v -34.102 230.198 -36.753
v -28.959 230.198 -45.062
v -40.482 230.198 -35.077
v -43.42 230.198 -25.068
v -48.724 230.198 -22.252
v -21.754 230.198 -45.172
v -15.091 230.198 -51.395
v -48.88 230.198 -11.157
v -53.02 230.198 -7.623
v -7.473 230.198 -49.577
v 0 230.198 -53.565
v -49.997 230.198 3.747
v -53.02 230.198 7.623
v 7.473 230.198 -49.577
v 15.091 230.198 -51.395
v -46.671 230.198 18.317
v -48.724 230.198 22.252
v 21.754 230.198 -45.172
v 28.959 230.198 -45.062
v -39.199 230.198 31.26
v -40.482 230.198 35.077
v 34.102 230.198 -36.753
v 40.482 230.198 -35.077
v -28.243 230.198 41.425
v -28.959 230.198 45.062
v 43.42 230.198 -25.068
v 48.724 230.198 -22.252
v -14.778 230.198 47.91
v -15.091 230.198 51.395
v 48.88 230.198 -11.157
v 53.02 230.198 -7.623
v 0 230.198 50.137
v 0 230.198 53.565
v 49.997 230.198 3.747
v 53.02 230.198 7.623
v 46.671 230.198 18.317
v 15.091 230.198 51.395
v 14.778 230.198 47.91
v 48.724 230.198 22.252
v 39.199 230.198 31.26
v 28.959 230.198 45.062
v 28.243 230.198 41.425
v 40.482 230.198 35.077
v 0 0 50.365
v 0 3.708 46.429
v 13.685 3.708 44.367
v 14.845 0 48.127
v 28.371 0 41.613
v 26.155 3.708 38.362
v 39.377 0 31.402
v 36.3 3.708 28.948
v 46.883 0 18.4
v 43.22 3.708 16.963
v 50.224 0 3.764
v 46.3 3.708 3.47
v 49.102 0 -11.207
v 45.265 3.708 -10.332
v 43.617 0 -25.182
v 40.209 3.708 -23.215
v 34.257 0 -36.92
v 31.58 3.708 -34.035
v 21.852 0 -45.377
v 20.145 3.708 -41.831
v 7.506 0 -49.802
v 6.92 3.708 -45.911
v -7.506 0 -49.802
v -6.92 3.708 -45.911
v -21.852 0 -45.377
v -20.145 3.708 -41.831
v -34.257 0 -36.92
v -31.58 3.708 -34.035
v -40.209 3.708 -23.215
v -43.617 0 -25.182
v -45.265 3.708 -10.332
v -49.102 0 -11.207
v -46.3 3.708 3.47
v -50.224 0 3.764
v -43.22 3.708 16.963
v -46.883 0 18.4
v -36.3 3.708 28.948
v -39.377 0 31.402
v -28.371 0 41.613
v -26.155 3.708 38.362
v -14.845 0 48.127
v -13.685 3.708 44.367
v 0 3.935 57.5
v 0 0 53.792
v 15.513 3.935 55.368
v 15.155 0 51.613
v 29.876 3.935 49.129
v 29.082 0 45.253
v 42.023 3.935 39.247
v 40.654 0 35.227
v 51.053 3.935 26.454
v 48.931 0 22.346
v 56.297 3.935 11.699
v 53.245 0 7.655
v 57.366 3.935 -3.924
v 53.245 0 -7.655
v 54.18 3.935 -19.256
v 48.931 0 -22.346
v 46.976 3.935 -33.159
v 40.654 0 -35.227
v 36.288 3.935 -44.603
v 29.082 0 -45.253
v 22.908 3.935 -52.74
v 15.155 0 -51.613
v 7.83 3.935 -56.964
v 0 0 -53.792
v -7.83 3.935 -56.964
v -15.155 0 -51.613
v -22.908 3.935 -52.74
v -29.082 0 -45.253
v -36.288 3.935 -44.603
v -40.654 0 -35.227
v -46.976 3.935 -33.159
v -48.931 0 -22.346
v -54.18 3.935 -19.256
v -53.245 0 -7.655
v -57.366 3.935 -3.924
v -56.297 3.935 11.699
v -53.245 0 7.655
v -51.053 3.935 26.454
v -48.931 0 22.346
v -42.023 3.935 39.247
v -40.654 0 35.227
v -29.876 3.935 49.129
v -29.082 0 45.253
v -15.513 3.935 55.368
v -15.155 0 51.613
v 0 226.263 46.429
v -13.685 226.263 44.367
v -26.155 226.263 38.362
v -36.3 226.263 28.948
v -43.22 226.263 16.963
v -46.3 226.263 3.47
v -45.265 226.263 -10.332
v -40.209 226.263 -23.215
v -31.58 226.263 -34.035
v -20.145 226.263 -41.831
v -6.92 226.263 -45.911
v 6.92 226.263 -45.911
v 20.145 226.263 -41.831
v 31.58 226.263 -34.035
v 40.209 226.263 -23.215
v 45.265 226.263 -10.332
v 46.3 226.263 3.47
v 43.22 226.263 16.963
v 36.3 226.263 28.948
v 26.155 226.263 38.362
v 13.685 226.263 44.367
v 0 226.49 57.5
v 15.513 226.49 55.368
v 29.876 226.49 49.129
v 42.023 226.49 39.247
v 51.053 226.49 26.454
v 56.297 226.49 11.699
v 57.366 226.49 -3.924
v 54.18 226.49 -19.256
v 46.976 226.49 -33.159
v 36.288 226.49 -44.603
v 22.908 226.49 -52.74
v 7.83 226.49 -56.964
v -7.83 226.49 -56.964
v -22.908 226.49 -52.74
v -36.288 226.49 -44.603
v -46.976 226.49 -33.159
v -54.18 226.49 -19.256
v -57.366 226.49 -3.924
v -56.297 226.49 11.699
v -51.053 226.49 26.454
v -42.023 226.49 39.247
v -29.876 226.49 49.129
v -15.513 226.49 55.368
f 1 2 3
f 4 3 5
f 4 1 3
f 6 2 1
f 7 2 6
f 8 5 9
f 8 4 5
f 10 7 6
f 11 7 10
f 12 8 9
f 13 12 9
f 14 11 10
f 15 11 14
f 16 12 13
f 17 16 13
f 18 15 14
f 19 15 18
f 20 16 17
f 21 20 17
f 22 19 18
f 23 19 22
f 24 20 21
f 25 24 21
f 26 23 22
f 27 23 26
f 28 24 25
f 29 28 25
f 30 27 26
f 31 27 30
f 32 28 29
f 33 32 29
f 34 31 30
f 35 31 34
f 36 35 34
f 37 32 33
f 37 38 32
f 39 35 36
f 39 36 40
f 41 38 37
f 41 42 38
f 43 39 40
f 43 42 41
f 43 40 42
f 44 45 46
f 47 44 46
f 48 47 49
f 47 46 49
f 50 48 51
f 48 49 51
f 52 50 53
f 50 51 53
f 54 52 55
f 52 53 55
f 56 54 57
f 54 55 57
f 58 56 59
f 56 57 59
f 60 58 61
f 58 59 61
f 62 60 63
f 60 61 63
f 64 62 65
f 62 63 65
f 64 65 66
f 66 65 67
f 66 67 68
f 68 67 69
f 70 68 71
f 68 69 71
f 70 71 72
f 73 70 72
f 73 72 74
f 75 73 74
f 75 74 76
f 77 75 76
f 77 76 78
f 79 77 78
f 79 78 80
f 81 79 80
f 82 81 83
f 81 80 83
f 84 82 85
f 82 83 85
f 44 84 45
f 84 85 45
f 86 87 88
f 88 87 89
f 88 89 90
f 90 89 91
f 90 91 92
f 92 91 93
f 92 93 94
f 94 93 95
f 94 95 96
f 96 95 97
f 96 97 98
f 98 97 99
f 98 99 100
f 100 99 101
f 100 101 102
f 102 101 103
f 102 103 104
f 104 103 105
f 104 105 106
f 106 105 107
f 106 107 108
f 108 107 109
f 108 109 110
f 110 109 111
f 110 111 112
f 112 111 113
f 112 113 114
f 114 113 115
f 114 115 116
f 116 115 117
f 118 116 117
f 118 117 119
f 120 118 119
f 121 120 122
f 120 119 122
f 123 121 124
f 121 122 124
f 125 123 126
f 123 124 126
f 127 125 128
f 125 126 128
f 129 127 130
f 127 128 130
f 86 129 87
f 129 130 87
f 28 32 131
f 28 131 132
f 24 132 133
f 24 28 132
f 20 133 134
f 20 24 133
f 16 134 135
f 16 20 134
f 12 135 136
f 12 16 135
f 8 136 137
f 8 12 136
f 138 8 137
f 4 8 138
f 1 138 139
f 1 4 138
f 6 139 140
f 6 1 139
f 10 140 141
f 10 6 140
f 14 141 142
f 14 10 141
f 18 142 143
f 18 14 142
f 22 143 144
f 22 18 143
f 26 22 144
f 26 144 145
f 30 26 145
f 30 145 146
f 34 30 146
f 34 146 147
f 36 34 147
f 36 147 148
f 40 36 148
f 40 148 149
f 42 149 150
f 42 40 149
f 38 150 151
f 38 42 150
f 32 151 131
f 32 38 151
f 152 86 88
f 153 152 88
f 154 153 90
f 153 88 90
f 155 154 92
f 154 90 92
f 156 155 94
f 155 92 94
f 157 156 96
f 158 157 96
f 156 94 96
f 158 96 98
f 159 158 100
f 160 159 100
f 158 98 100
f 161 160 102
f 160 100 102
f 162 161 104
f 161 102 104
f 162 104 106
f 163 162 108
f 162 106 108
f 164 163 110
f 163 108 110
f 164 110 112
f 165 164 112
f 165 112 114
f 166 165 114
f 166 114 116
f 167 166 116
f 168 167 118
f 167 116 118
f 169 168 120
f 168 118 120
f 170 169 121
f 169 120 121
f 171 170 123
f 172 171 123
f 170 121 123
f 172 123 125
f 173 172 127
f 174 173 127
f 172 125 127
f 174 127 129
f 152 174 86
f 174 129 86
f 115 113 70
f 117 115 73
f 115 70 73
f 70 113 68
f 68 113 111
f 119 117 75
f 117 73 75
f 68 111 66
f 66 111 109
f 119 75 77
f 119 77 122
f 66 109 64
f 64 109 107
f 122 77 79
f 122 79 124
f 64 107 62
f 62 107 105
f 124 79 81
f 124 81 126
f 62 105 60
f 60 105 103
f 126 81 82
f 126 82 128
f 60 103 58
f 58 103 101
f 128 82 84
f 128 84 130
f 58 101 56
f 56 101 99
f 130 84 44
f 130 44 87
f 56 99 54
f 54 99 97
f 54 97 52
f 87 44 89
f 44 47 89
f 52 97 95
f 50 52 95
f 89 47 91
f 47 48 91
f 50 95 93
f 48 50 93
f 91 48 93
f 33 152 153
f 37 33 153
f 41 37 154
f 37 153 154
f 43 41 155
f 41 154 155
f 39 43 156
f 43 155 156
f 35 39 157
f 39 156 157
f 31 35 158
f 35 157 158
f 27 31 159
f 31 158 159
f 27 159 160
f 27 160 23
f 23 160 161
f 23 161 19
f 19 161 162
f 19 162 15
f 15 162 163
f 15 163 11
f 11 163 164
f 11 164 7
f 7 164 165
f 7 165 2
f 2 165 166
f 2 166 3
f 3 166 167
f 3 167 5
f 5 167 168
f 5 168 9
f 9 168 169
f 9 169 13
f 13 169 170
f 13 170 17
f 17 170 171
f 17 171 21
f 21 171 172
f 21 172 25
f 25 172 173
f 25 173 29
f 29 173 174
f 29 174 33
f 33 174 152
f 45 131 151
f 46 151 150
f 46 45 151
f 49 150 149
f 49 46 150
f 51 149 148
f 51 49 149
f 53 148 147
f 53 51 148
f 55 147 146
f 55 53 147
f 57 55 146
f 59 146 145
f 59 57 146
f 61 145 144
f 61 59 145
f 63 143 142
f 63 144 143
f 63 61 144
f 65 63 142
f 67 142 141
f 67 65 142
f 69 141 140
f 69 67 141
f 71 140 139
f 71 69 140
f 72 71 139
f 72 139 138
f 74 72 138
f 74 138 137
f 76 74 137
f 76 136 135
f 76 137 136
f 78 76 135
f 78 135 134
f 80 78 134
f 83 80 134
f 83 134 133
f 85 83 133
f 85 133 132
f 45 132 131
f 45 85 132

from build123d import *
from OCP.BRepFilletAPI import BRepFilletAPI_MakeChamfer

# Parameters (mm, degrees)
SKETCH1_R           = 57.5
BOSS_EXTRUDE1_DEPTH = 230.197861075
SKETCH2_R           = 46.429396427
CUT_EXTRUDE1_DEPTH  = 245.138393629
CHAMFER1_SIZE       = 3.707562958
CHAMFER1_SIZE2      = 3.935280895


with BuildPart() as part:
    # Sketch1 → Boss-Extrude1 (new body)
    with BuildSketch(Plane(origin=(0, 0, 0), x_dir=(1, 0, 0), z_dir=(0, 1, 0))):
        Circle(SKETCH1_R)
    extrude(amount=BOSS_EXTRUDE1_DEPTH)

    # Sketch2 → Cut-Extrude1 (cut, through all)
    with BuildSketch(Plane(origin=(0, 0, 0), x_dir=(1, 0, 0), z_dir=(0, 1, 0))):
        Circle(SKETCH2_R)
    extrude(amount=CUT_EXTRUDE1_DEPTH, mode=Mode.SUBTRACT)

    # Chamfer1: one chamfer whose edges measure the first distance from different faces: ONE call of the kernel's chamfer builder (chamfer() names one face for all edges)
    chamfer1_edges_1 = [part.edges().sort_by_distance(p)[0] for p in [
        (-46.429396427, 230.197861075, 0),
    ]]
    chamfer1_side_1 = [part.faces().sort_by_distance(p)[0] for p in [
        (-55.873654403, 230.197861075, 0),
    ]]
    chamfer1_edges_2 = [part.edges().sort_by_distance(p)[0] for p in [
        (-46.429396427, 0, 0),
    ]]
    chamfer1_side_2 = [part.faces().sort_by_distance(p)[0] for p in [
        (-46.429396427, 115.098930538, 0),
    ]]
    chamfer1_edges_3 = [part.edges().sort_by_distance(p)[0] for p in [
        (-57.5, 0, 0),
    ]]
    chamfer1_side_3 = [part.faces().sort_by_distance(p)[0] for p in [
        (-55.873654403, 0, 0),
    ]]
    chamfer1_edges_4 = [part.edges().sort_by_distance(p)[0] for p in [
        (-57.5, 230.197861075, 0),
    ]]
    chamfer1_side_4 = [part.faces().sort_by_distance(p)[0] for p in [
        (-57.5, 115.098930538, 0),
    ]]
    chamfer1 = BRepFilletAPI_MakeChamfer(part.part.solid().wrapped)
    for e in chamfer1_edges_1:
        chamfer1.Add(CHAMFER1_SIZE, CHAMFER1_SIZE2, e.wrapped, chamfer1_side_1[0].wrapped)  # the first distance lies on this face
    for e in chamfer1_edges_2:
        chamfer1.Add(CHAMFER1_SIZE, CHAMFER1_SIZE2, e.wrapped, chamfer1_side_2[0].wrapped)  # the first distance lies on this face
    for e in chamfer1_edges_3:
        chamfer1.Add(CHAMFER1_SIZE, CHAMFER1_SIZE2, e.wrapped, chamfer1_side_3[0].wrapped)  # the first distance lies on this face
    for e in chamfer1_edges_4:
        chamfer1.Add(CHAMFER1_SIZE, CHAMFER1_SIZE2, e.wrapped, chamfer1_side_4[0].wrapped)  # the first distance lies on this face
    add(Compound.cast(chamfer1.Shape()), mode=Mode.REPLACE)


solid = part.part
